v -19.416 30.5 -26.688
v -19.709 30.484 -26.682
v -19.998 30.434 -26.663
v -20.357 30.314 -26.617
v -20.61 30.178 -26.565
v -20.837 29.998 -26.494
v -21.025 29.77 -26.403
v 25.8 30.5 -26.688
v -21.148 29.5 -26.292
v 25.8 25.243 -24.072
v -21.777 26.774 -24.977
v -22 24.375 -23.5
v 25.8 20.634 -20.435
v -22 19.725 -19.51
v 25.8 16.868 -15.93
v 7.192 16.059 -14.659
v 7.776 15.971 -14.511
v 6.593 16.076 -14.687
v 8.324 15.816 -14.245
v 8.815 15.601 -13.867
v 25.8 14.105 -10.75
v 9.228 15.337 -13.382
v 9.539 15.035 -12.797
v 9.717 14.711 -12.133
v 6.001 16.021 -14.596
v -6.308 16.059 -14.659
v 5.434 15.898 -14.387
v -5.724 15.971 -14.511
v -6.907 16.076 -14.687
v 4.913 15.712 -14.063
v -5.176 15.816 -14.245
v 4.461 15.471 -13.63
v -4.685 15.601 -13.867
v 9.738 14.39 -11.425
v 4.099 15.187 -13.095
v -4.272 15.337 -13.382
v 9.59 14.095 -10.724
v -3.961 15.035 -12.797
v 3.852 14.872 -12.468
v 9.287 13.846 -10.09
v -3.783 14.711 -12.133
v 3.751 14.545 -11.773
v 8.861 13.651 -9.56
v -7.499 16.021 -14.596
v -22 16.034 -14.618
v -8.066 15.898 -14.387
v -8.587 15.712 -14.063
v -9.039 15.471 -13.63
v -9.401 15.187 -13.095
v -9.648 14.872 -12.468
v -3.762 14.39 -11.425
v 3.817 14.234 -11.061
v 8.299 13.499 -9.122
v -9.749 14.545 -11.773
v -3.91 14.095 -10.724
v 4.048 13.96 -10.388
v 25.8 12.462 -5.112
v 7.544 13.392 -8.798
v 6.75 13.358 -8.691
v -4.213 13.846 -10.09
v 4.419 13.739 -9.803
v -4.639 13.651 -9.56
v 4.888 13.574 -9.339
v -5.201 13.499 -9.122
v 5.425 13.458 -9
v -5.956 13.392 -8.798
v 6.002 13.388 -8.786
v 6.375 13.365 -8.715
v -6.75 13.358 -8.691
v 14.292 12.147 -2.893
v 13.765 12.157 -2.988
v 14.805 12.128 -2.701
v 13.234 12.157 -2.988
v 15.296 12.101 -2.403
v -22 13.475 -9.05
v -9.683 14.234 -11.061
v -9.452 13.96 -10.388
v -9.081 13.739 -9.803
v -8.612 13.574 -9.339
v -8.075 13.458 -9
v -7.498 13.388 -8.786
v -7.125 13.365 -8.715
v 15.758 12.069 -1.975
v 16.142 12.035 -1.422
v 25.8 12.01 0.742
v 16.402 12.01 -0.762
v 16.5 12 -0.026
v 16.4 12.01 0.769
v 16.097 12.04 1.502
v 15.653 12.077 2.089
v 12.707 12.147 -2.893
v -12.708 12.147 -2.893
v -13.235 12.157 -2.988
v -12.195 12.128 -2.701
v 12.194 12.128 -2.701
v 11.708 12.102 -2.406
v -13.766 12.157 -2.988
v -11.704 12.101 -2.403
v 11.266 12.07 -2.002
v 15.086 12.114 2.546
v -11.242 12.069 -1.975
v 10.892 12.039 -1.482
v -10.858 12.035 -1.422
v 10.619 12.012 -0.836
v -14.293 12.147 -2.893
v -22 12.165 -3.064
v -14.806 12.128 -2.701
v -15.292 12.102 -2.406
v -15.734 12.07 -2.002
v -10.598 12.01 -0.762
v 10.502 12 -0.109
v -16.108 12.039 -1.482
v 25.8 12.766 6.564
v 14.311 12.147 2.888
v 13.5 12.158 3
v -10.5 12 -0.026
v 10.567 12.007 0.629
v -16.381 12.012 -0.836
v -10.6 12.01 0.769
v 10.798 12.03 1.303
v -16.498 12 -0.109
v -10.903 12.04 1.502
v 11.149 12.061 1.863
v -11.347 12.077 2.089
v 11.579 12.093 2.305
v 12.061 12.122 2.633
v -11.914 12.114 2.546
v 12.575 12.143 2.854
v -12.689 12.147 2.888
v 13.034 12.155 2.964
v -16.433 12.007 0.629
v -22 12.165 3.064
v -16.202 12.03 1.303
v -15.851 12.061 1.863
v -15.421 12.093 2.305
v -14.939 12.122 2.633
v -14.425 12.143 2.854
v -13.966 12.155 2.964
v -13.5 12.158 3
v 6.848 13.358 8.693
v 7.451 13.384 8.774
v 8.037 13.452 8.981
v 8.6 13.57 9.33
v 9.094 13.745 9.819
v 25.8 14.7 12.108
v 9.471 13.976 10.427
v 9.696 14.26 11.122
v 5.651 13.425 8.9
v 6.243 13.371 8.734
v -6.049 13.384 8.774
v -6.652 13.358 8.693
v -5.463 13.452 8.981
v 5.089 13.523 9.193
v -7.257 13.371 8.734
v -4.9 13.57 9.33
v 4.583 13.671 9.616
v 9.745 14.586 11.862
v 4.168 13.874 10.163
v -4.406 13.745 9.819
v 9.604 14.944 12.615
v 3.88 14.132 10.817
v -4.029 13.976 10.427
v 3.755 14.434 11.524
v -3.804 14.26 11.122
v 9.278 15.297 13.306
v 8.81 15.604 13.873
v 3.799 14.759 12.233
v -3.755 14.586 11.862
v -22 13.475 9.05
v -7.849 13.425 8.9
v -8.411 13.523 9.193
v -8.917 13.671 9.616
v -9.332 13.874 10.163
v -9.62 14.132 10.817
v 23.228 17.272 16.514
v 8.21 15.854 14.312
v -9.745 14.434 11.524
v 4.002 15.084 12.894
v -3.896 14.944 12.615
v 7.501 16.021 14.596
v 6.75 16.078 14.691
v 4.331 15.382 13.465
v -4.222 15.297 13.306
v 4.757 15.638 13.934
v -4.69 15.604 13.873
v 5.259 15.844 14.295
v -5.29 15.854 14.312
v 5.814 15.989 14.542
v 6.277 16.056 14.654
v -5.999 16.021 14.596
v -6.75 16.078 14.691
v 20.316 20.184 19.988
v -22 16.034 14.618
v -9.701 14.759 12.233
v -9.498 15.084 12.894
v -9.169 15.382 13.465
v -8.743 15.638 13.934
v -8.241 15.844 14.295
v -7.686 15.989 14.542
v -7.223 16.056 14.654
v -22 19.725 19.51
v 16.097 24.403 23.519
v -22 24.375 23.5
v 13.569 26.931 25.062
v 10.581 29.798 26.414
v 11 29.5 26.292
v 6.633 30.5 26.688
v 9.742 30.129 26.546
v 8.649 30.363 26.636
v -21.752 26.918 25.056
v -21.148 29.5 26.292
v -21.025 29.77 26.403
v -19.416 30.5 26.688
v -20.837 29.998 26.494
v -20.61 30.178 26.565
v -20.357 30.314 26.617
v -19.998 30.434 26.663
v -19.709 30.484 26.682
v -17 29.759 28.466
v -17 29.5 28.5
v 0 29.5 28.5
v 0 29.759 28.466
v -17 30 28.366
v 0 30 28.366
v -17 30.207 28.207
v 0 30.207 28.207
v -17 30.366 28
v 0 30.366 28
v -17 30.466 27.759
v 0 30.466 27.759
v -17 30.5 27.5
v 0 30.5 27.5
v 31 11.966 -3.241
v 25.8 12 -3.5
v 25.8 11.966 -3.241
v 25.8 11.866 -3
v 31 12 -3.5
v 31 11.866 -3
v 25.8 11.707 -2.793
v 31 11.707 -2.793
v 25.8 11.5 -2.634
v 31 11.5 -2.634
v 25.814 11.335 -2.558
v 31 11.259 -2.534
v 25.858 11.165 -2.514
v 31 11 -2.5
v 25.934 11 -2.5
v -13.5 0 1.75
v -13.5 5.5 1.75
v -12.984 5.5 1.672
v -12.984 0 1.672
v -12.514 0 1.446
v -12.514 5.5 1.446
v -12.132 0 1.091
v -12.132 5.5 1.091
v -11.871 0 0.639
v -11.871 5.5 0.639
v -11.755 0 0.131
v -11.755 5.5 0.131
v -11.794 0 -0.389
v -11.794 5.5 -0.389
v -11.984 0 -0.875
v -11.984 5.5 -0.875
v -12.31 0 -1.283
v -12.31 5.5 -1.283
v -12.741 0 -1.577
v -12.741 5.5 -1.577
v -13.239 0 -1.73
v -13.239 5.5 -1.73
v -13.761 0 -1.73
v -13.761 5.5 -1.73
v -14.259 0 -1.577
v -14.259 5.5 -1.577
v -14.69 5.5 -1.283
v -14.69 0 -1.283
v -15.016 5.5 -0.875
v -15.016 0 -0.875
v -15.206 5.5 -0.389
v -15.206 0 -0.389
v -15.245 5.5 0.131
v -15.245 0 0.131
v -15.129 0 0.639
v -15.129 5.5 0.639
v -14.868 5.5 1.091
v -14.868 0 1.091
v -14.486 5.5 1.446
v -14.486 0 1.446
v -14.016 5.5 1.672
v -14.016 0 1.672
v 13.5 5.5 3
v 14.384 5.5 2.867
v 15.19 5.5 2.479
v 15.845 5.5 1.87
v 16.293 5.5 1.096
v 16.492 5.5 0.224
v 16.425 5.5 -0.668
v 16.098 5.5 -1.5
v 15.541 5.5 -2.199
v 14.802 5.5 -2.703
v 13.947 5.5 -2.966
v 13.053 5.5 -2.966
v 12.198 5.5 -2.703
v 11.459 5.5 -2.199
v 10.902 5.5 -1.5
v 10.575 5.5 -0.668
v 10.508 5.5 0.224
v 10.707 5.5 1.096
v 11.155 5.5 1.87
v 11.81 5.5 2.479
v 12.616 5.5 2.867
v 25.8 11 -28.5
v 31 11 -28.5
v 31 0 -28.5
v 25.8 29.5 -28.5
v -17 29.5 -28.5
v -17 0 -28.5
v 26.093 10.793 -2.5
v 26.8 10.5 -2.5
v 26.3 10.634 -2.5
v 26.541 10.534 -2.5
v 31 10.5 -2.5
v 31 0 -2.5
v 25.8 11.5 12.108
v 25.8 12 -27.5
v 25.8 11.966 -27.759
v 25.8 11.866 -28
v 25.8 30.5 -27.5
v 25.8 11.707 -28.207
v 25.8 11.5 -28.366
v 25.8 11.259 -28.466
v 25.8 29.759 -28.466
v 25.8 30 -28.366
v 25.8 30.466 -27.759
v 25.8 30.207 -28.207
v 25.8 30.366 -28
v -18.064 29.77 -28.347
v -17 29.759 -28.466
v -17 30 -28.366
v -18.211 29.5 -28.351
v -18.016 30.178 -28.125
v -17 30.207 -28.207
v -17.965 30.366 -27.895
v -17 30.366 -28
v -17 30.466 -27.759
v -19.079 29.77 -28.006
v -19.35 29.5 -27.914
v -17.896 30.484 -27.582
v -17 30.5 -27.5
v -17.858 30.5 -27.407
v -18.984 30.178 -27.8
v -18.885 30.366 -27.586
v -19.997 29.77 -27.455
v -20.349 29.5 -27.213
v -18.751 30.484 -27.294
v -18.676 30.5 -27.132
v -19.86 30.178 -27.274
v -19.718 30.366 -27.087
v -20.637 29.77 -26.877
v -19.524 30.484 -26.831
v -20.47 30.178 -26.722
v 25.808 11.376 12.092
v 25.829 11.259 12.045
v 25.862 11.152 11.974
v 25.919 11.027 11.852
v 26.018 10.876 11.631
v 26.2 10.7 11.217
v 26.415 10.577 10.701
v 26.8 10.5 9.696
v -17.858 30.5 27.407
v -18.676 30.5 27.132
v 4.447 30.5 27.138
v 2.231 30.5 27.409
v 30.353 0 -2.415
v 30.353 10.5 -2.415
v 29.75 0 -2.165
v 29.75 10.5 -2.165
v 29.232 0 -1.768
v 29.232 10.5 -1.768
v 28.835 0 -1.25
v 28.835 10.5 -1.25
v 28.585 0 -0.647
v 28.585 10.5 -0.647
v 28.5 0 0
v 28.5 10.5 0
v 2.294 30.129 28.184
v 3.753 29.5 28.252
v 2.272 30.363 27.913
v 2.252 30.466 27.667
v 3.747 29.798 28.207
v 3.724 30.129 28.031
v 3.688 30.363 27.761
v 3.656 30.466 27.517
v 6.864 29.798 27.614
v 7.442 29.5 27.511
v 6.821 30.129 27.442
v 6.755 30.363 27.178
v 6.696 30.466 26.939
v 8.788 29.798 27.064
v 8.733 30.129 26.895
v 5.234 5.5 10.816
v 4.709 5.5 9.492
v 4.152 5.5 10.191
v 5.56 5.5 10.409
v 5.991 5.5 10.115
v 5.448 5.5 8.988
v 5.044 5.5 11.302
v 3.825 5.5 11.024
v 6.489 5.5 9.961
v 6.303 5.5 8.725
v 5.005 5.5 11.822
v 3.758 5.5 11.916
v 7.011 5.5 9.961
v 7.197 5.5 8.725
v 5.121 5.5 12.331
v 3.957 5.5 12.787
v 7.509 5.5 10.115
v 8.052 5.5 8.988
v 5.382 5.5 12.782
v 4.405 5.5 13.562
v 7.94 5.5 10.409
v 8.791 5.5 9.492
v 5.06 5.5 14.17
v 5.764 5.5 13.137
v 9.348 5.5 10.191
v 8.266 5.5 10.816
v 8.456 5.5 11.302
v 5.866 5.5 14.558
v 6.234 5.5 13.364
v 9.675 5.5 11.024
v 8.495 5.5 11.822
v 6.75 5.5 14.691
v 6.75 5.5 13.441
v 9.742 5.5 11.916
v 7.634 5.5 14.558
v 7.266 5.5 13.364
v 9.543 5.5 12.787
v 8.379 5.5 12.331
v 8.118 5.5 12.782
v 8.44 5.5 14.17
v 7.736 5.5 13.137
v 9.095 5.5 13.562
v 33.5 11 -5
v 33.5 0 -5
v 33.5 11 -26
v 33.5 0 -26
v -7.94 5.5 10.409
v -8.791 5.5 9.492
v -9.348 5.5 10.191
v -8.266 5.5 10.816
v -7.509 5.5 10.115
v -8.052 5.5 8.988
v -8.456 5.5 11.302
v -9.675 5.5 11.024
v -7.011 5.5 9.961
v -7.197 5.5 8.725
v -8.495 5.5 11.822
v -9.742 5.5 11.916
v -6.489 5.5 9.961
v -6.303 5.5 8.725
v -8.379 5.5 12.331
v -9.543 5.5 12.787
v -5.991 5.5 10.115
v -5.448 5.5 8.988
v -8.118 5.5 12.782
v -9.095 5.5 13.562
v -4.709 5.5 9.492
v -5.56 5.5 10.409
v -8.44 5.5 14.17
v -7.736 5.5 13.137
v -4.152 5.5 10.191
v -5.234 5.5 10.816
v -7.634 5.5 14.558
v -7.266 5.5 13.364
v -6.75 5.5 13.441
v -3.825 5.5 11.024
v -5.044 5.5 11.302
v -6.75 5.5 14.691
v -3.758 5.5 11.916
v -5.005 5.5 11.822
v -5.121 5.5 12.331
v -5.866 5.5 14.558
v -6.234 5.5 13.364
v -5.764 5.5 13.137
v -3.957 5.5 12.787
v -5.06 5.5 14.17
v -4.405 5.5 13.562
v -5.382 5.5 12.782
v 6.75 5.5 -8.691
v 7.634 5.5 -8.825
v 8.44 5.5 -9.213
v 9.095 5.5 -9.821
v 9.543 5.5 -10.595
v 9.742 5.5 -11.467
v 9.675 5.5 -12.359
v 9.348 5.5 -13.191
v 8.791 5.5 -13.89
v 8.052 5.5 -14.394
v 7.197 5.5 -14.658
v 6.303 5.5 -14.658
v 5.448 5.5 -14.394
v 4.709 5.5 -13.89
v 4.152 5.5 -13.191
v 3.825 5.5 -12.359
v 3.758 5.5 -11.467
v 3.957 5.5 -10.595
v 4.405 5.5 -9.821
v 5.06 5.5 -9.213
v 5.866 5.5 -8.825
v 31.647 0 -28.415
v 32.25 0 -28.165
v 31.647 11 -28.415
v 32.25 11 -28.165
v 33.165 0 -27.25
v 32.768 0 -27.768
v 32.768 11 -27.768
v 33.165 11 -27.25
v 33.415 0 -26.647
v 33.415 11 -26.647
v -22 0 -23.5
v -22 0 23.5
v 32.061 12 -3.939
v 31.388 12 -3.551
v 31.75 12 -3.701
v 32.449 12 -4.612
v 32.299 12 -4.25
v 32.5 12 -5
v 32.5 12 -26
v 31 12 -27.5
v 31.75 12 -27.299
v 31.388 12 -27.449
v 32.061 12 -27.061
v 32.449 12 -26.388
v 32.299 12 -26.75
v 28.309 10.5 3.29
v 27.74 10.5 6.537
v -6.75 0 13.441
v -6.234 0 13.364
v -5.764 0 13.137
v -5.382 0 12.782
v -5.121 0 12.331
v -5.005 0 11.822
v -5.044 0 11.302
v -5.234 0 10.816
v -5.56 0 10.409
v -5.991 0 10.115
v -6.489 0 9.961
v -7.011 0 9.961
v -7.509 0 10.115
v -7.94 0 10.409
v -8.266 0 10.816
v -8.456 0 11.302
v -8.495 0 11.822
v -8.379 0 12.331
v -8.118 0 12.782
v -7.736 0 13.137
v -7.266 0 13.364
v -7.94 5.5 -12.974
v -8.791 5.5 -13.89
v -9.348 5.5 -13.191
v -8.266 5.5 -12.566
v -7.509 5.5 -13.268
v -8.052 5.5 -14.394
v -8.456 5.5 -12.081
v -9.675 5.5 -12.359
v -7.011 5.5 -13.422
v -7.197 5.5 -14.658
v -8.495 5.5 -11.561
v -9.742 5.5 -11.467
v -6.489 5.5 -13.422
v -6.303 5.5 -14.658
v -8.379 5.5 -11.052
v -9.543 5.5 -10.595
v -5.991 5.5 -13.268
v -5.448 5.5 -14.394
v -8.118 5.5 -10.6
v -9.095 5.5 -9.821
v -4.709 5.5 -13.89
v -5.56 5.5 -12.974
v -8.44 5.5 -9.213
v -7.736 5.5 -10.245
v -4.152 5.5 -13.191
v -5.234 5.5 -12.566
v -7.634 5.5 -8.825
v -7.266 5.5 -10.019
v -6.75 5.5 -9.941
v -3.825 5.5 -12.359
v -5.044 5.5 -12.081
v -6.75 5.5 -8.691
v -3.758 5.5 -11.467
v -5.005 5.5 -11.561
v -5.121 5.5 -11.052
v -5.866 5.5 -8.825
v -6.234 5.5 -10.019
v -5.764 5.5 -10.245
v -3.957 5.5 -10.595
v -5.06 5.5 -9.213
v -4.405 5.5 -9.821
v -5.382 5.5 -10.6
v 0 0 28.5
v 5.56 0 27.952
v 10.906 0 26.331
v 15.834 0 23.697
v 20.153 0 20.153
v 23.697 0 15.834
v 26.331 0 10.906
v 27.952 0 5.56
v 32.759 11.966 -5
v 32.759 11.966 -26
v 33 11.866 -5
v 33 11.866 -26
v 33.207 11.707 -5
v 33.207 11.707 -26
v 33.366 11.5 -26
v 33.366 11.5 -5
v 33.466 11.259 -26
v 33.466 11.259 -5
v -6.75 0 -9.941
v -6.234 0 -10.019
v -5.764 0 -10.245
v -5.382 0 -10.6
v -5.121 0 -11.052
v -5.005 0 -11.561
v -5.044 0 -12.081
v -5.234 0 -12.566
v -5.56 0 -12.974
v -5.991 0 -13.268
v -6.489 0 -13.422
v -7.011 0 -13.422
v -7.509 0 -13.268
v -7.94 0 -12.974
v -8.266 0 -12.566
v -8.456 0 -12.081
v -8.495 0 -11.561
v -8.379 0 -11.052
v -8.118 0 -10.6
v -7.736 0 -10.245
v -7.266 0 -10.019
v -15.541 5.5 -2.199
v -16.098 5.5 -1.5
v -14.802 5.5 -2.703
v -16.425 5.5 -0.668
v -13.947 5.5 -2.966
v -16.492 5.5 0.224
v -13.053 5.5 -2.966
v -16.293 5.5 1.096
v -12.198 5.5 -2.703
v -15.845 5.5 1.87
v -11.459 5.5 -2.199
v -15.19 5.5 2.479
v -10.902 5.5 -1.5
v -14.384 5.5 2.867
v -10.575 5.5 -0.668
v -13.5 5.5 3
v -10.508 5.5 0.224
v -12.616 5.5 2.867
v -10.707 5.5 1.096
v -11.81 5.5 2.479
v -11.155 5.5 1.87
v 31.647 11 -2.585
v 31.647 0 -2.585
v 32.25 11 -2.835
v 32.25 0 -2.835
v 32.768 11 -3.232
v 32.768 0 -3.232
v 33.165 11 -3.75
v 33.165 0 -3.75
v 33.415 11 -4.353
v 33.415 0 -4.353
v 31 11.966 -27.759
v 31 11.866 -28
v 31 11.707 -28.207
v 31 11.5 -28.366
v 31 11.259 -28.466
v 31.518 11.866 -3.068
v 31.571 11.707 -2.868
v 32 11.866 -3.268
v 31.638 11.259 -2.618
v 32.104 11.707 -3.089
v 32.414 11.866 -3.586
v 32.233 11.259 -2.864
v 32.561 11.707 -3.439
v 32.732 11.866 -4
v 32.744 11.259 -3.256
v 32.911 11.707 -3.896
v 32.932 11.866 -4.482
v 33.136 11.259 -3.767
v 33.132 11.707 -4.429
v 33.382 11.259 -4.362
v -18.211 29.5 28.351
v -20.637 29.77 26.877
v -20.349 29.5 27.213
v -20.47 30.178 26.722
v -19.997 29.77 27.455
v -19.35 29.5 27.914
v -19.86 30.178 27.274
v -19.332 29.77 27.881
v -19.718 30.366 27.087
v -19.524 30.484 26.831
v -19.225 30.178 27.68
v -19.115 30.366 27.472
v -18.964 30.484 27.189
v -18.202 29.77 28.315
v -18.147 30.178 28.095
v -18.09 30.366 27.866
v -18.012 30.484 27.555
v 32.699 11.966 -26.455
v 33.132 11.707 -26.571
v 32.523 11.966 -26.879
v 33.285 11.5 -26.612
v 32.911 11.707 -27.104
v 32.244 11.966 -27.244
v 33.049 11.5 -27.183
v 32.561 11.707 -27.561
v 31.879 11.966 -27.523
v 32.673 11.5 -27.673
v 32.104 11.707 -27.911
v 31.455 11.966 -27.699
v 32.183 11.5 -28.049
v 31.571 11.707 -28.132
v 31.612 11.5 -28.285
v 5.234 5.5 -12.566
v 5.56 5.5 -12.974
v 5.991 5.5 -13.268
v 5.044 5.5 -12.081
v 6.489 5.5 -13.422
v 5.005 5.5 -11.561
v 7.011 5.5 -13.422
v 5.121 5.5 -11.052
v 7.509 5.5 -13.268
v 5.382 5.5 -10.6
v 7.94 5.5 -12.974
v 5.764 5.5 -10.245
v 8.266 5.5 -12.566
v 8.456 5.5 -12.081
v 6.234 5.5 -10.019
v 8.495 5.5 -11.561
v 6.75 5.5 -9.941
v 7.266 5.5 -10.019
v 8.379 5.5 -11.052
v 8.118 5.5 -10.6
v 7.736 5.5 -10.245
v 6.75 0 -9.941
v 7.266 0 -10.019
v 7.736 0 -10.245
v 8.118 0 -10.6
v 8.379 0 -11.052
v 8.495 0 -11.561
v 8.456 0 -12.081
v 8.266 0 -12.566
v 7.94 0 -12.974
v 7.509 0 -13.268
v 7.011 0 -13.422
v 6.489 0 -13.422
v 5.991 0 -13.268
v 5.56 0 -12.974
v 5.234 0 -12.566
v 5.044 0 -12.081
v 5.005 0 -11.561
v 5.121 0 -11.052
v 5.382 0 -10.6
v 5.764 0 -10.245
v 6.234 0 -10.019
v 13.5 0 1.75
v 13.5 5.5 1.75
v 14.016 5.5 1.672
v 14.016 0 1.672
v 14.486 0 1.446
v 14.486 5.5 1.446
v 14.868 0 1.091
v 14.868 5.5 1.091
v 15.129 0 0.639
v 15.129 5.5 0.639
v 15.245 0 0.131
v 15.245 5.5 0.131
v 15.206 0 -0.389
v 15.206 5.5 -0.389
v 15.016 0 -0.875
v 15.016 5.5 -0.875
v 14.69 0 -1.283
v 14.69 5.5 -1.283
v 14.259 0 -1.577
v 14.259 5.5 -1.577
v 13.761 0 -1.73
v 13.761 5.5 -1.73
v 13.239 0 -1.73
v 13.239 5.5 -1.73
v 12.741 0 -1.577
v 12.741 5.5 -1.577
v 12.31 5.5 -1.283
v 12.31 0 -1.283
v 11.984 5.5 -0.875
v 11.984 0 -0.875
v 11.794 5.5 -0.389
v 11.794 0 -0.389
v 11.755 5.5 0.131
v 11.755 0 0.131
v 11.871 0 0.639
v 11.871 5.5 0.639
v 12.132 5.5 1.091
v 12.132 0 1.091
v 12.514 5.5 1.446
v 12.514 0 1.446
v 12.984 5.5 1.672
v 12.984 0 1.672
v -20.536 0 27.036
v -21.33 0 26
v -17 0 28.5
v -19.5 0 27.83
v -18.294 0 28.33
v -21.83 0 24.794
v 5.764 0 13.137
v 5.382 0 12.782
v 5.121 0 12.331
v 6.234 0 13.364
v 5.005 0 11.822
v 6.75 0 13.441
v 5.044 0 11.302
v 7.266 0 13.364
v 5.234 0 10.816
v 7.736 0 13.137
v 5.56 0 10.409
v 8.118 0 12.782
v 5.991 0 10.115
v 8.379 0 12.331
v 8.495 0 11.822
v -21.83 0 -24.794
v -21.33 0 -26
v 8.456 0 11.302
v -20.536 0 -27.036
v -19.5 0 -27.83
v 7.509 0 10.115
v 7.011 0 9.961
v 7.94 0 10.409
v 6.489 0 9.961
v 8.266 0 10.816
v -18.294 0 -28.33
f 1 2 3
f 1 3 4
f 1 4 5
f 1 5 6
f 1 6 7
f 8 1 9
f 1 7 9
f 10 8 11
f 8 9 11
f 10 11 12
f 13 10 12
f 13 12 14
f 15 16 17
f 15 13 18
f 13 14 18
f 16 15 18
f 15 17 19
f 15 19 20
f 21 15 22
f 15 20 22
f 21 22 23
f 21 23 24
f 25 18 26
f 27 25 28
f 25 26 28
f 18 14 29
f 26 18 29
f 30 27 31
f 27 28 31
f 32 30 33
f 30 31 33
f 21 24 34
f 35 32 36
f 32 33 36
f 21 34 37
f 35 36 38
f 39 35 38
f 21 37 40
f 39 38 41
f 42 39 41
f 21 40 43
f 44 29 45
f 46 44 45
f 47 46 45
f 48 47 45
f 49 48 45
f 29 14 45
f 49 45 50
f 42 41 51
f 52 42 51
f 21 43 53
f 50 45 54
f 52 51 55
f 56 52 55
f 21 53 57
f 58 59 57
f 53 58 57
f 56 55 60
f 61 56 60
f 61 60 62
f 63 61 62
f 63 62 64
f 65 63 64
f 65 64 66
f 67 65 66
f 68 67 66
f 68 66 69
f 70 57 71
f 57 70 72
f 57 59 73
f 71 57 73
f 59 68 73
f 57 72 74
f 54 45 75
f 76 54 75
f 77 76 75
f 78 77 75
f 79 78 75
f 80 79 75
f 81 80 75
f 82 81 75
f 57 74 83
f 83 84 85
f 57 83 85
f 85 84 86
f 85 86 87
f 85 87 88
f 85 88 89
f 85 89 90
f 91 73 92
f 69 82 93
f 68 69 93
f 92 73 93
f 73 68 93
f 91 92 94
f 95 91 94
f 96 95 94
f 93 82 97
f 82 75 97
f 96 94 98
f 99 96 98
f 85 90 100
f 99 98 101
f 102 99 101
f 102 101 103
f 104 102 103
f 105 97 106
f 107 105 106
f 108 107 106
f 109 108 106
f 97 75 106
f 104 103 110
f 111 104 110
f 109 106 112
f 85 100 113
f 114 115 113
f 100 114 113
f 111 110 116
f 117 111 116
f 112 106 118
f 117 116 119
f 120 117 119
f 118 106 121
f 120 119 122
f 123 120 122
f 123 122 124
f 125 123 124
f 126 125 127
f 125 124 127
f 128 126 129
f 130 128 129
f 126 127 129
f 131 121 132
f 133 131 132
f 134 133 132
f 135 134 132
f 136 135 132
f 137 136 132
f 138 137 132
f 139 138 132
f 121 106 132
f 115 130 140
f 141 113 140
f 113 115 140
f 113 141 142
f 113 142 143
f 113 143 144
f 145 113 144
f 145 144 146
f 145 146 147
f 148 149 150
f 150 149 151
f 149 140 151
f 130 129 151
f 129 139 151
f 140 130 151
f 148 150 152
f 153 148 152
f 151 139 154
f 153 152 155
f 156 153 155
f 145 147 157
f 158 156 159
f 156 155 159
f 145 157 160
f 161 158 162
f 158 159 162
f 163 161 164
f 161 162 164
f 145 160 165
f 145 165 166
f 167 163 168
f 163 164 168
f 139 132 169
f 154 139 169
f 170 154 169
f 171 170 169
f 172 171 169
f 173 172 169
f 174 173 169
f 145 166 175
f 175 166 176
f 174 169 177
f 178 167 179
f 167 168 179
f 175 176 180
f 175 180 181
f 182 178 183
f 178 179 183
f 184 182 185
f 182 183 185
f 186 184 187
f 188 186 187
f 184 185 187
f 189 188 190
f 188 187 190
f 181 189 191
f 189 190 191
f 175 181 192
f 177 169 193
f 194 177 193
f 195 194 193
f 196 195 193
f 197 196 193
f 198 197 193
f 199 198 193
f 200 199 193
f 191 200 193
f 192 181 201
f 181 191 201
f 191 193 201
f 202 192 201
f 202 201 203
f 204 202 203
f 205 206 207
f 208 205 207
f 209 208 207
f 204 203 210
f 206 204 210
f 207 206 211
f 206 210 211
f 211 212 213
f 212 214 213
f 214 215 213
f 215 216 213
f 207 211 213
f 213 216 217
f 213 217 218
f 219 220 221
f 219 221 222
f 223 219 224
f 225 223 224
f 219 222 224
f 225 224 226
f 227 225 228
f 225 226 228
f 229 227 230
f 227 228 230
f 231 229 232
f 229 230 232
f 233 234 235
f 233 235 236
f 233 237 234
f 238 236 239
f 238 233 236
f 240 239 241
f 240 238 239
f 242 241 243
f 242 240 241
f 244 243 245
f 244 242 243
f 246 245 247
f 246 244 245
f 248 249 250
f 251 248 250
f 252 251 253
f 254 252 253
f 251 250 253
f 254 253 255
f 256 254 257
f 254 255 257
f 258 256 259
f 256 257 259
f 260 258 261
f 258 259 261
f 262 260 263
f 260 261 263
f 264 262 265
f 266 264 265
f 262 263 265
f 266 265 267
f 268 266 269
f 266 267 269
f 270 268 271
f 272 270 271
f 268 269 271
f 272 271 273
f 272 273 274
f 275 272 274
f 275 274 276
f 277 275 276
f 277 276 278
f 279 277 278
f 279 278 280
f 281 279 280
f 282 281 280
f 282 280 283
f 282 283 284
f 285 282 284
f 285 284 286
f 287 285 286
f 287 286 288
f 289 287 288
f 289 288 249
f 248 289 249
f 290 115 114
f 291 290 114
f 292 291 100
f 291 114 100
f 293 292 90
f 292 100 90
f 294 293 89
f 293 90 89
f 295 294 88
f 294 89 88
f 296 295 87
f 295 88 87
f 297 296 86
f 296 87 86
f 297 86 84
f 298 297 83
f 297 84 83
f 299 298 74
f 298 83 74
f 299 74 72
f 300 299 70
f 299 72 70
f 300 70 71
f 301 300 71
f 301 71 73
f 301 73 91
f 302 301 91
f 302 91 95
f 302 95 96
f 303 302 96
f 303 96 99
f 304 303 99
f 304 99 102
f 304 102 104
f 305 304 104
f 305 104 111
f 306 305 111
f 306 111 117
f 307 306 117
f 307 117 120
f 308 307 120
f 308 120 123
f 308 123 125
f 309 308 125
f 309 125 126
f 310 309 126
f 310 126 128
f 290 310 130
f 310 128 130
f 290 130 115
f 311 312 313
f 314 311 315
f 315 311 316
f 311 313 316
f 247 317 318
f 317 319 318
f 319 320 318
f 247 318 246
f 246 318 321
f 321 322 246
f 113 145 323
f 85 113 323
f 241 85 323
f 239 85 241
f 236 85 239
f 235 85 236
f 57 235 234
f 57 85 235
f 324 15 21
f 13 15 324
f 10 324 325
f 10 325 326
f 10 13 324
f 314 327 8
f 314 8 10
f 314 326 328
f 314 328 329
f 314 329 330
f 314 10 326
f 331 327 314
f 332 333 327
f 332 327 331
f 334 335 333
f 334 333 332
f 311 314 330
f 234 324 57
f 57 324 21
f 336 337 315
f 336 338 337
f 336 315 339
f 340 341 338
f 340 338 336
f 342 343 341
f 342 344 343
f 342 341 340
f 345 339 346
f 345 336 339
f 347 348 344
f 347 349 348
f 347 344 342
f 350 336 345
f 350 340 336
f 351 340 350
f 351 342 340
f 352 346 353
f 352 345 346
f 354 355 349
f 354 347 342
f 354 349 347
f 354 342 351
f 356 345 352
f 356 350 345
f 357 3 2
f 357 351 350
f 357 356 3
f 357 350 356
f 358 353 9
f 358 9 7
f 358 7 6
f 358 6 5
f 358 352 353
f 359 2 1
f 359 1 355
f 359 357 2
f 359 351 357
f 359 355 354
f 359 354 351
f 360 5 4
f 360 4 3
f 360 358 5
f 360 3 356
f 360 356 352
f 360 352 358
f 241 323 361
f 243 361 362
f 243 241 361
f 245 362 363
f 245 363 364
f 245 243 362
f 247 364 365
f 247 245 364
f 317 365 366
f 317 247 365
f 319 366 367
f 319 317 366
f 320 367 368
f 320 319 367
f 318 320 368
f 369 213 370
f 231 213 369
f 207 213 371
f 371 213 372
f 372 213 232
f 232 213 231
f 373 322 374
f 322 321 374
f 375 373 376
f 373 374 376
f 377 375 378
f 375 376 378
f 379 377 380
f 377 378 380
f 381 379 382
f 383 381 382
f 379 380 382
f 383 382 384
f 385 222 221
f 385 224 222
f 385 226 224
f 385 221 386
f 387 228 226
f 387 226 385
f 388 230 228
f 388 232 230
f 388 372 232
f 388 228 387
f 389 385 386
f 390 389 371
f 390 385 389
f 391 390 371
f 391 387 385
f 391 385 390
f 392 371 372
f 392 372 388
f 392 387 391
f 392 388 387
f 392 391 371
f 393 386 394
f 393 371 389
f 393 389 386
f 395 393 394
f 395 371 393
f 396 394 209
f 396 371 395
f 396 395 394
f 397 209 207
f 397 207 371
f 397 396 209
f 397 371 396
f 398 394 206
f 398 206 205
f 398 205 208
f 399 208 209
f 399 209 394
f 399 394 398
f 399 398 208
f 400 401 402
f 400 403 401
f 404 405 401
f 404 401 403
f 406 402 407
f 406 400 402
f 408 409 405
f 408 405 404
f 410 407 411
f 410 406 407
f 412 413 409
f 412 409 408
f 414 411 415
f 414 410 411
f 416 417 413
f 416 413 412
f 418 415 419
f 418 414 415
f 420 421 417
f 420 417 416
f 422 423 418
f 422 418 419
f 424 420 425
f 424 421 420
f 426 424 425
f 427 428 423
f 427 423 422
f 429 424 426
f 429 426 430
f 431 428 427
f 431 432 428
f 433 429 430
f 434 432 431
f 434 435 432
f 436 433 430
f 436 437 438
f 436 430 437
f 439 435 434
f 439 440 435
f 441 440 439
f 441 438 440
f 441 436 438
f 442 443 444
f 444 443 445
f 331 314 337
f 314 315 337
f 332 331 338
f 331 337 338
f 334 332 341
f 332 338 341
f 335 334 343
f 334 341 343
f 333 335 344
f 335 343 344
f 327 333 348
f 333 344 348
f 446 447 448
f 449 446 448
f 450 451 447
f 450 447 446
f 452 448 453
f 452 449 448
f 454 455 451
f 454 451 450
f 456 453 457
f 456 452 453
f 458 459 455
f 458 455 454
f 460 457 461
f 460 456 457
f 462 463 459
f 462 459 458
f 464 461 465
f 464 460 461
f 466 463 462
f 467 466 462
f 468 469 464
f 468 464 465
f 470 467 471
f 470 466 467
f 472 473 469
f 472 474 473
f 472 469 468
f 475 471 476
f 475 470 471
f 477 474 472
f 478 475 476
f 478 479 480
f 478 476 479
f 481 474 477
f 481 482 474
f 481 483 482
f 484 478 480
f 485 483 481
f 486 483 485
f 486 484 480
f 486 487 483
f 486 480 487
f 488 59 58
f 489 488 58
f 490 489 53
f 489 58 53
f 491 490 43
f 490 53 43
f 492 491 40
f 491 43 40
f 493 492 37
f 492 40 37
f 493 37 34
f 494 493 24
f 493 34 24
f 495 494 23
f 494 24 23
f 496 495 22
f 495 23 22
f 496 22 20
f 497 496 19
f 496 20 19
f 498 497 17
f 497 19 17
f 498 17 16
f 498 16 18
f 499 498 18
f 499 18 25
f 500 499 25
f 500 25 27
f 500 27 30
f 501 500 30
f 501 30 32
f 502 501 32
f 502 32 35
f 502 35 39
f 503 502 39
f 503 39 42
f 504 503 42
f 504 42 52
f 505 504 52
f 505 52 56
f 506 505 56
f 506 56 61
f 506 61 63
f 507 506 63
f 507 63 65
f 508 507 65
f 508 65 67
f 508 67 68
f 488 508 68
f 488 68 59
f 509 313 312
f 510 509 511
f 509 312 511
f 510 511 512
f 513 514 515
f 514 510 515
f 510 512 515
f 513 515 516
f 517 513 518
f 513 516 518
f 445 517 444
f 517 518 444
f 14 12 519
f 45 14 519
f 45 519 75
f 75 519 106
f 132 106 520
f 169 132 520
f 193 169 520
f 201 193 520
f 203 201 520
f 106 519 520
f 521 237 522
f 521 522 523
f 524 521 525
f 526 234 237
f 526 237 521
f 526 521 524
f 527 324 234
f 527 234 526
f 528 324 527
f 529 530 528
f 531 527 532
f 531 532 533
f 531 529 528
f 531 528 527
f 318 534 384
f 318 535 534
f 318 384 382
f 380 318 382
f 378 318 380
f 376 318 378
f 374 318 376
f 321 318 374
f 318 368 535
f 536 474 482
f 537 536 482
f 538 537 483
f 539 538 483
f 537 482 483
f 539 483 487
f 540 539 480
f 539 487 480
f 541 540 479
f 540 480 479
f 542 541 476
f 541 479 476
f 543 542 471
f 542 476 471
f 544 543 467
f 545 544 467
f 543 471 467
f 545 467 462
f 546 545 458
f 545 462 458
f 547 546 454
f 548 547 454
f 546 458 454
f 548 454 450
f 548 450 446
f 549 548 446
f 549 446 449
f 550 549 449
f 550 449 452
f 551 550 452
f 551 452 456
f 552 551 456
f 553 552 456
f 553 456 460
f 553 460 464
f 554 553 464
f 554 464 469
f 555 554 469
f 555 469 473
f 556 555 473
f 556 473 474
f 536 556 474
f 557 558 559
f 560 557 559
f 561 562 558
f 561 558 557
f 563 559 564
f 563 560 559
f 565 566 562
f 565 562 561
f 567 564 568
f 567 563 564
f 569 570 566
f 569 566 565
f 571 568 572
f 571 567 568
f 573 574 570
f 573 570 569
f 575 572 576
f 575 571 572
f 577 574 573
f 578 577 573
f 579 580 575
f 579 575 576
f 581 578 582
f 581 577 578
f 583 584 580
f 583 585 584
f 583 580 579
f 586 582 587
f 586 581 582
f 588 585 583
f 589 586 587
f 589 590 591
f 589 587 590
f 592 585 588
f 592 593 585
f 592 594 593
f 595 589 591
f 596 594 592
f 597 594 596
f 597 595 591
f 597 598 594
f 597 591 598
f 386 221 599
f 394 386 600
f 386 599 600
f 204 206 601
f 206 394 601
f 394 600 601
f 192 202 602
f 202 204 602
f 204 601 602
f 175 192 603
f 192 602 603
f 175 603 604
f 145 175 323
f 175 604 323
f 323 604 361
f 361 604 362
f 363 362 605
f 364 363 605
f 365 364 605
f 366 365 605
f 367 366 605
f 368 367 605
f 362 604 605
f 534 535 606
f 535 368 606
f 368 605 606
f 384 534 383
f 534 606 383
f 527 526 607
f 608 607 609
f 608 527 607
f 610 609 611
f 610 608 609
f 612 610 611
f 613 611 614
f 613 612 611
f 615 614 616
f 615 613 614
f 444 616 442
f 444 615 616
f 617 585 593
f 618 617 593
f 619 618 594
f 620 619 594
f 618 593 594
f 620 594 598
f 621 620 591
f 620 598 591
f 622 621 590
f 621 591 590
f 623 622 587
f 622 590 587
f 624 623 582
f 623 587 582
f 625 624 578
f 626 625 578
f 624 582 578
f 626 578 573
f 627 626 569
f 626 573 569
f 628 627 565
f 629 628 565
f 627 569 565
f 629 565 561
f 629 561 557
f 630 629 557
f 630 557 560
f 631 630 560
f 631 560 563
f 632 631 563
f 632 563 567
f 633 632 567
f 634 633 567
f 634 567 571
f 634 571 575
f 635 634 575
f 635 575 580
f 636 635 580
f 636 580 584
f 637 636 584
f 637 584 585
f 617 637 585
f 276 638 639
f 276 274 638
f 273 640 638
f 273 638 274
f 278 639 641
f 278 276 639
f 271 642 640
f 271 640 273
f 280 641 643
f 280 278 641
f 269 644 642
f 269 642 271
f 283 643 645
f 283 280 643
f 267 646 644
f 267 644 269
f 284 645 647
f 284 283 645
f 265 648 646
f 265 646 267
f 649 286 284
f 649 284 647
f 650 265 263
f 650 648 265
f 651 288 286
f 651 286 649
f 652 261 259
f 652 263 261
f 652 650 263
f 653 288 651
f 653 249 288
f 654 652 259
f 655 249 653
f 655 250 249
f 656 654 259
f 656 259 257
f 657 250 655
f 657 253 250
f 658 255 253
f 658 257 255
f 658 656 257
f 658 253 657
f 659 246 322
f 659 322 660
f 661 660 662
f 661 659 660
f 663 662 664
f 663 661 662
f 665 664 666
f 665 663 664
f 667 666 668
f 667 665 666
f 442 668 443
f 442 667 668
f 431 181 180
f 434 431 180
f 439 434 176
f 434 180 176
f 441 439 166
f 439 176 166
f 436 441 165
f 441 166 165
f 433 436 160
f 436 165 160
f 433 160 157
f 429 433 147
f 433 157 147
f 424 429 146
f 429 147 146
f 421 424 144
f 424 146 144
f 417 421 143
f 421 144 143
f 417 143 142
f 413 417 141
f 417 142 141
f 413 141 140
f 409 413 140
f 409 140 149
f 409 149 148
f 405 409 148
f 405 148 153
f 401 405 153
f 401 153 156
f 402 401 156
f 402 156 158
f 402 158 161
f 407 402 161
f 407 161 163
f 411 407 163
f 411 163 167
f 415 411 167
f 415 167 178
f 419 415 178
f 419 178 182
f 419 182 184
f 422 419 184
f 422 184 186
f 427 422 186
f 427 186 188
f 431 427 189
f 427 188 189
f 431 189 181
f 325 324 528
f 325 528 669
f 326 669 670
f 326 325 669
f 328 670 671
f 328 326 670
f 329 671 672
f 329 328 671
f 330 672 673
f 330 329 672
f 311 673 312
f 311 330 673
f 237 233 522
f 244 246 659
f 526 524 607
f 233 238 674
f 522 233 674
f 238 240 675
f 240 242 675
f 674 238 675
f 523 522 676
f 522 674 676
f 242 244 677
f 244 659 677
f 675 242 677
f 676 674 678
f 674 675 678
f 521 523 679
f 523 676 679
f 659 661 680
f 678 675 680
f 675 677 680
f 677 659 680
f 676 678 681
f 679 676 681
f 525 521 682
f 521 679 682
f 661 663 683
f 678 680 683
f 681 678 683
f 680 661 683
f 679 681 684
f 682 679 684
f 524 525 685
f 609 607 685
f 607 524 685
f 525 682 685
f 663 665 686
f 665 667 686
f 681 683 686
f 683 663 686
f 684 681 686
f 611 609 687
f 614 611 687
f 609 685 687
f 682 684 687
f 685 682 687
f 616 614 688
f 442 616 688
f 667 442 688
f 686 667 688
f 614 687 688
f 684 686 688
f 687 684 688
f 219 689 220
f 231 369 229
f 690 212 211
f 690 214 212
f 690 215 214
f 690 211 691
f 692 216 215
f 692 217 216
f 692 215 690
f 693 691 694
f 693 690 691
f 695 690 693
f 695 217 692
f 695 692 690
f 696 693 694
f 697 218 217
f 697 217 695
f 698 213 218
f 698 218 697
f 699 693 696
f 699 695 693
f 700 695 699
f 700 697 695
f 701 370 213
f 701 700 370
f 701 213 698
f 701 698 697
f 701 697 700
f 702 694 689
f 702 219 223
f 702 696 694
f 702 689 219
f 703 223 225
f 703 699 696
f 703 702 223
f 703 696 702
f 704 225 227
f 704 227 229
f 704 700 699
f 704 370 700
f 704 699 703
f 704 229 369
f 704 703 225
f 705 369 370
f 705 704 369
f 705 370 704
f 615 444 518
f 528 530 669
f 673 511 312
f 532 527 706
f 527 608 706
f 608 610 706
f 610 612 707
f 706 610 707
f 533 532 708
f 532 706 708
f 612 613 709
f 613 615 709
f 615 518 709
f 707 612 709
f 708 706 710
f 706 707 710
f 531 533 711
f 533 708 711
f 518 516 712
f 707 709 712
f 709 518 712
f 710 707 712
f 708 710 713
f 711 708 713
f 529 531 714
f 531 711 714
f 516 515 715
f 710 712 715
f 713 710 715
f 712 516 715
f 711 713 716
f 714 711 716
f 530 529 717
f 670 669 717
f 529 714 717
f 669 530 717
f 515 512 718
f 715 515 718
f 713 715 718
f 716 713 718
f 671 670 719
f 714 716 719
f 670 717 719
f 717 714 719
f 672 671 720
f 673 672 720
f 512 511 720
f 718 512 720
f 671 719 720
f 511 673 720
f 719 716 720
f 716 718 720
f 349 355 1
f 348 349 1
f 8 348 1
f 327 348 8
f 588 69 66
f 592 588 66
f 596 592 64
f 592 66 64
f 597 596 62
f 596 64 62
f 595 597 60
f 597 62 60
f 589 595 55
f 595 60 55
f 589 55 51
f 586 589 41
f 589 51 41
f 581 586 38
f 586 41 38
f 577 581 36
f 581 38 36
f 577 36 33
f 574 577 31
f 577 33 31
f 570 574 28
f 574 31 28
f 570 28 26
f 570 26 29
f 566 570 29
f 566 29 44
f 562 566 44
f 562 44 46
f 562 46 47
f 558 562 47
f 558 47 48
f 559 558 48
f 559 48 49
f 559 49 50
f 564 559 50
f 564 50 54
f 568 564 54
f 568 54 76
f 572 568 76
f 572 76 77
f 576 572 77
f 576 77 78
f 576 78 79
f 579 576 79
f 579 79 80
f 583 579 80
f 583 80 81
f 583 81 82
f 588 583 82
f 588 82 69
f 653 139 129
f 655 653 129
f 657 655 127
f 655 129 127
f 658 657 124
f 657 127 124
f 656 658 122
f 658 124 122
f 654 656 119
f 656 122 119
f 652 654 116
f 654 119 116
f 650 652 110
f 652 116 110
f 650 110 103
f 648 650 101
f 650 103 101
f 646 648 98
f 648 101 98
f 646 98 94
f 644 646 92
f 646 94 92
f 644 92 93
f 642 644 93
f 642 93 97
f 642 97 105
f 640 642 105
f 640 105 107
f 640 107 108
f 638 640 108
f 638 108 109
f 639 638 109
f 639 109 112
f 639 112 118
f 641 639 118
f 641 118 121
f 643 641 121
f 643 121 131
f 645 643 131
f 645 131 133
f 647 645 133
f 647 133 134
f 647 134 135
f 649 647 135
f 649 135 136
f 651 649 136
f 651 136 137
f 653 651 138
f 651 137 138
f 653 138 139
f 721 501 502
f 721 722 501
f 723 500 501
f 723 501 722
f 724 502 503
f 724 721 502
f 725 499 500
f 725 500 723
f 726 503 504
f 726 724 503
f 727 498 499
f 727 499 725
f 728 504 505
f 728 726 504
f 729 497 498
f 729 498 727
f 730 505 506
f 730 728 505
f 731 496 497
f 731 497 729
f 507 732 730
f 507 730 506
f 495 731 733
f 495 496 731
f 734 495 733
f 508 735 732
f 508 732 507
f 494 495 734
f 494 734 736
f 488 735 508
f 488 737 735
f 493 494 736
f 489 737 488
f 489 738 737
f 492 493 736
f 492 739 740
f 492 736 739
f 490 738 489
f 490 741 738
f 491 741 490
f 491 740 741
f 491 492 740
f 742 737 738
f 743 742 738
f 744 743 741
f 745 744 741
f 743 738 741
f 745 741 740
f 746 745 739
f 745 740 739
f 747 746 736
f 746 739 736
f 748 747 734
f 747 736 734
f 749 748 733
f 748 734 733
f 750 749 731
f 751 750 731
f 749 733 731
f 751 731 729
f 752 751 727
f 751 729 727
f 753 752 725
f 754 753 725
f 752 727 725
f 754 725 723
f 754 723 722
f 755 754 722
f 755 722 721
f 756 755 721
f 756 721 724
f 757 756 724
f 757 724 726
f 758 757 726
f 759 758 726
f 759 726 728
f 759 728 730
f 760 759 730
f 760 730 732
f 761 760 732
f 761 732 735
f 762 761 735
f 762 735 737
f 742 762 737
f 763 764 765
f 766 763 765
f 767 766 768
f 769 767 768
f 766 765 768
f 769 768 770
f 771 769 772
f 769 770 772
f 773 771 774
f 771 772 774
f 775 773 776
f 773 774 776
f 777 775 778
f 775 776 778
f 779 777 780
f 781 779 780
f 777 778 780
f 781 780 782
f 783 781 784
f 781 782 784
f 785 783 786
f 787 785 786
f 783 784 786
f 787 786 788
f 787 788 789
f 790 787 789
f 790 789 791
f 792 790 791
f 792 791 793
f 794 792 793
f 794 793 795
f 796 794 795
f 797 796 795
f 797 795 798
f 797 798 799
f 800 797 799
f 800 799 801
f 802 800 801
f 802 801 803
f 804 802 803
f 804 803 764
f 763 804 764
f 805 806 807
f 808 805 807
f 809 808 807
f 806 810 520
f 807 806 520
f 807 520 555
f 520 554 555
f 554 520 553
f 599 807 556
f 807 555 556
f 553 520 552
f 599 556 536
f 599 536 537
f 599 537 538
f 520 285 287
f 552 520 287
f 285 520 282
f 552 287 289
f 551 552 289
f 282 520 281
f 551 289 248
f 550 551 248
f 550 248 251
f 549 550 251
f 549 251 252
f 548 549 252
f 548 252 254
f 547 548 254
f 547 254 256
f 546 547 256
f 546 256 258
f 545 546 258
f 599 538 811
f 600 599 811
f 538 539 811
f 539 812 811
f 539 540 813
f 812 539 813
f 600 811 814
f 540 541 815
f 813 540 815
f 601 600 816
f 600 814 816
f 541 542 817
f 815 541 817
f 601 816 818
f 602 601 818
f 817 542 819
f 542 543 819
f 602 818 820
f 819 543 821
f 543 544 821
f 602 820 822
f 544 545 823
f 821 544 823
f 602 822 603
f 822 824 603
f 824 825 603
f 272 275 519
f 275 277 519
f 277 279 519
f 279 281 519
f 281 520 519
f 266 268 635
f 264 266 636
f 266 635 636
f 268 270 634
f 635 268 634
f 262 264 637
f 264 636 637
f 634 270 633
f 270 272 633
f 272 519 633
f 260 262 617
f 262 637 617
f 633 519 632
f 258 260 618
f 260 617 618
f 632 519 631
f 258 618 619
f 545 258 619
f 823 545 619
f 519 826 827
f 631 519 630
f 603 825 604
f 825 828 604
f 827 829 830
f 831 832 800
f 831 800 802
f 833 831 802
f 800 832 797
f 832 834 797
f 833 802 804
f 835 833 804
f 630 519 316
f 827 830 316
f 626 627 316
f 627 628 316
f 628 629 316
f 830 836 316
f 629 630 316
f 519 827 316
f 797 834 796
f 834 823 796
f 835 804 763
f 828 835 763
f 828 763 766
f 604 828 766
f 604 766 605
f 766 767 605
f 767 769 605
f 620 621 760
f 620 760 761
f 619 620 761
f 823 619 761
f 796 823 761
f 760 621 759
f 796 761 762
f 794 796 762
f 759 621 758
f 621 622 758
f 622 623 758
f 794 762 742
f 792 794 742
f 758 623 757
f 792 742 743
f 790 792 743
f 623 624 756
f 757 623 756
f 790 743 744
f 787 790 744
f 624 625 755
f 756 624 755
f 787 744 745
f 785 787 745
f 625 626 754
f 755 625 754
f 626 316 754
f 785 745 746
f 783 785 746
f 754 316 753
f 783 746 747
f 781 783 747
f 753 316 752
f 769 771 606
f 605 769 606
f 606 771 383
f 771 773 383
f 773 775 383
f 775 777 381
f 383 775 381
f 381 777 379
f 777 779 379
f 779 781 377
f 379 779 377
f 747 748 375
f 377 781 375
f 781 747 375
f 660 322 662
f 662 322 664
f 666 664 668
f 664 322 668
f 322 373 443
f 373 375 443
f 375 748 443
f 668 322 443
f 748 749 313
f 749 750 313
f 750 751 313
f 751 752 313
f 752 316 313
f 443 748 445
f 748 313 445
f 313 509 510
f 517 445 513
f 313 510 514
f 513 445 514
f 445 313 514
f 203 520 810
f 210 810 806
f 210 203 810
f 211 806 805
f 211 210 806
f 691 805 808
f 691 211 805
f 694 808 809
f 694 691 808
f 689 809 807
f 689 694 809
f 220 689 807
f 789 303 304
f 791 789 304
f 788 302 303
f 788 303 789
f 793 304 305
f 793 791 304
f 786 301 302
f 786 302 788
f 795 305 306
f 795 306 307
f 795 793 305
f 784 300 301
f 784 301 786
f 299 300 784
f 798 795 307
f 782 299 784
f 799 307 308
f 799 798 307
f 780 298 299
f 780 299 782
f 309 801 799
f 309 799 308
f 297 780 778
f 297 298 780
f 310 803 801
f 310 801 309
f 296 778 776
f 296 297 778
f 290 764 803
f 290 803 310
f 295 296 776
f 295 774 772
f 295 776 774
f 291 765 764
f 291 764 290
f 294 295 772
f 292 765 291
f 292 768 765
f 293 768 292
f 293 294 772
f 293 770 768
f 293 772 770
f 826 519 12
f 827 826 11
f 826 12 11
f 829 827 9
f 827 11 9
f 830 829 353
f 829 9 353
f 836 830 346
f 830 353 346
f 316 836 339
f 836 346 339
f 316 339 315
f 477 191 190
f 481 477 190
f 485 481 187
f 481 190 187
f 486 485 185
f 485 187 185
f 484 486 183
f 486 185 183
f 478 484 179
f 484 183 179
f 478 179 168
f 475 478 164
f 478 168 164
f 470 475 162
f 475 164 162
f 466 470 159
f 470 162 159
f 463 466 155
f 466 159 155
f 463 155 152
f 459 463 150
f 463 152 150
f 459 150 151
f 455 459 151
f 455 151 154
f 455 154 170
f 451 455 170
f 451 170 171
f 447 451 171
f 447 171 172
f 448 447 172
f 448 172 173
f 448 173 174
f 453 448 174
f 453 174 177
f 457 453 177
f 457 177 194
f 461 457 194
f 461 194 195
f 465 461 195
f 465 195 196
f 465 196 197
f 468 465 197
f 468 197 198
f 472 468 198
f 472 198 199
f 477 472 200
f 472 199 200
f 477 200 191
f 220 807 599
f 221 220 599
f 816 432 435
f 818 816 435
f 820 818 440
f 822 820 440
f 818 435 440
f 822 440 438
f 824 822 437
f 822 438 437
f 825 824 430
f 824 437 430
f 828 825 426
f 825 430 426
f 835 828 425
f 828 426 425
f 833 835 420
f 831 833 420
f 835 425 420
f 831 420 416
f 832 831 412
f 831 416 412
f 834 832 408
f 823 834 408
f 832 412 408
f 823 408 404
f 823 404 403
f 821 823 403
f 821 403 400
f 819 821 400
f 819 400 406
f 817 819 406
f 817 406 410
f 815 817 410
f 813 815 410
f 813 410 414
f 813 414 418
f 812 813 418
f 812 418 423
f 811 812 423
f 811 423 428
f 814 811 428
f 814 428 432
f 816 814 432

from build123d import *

# Parameters (mm, degrees)
EXTRUDE_1_DEPTH     = 40.5
SKETCH_2_R          = 1.75
CUT_EXTRUDE_1_DEPTH = 44
FILLET_6_R          = 5
SKETCH_5_R          = 3
CUT_EXTRUDE_2_DEPTH = 35
SKETCH_6_R          = 7.5
CUT_EXTRUDE_3_DEPTH = 10
CUT_EXTRUDE_4_REACH = 76.382
SKETCH_8_R          = 28.5
SKETCH_4_W          = 7.7
SKETCH_4_H          = 50
CUT_EXTRUDE_5_DEPTH = 30
SKETCH_9_W          = 74.837423064
SKETCH_9_H          = 60.925338007
CUT_EXTRUDE_6_DEPTH = 10
SKETCH_11_W         = 7.7
SKETCH_11_H         = 26
EXTRUDE_2_DEPTH     = 1.5
FILLET_12_R         = 2.5
FILLET_13_R         = 1
FILLET_14_R         = 1
FILLET_15_R         = 2.5
FILLET_START        = 25.8
FILLET_16_DEPTH     = 8.2
FILLET_16_2_ANGLE   = 90
FILLET_17_R         = 1


with BuildPart() as part:
    # 草图1 → 凸台-拉伸1 (new body)
    with BuildSketch(Plane(origin=(0, 0, 0), x_dir=(1, 0, 0), z_dir=(0, 1, 0))):
        with BuildLine():
            Line((0, 28.5), (-22, 28.5))
            Line((-22, 28.5), (-22, -28.5))
            Line((-22, -28.5), (0, -28.5))
            ThreePointArc((0, -28.5), (20.152543264, -20.152543264), (28.5, 0))
            Line((28.5, 0), (28.5, 2.5))
            Line((28.5, 2.5), (33.5, 2.5))
            Line((33.5, 2.5), (33.5, 28.5))
            Line((33.5, 28.5), (0, 28.5))
        make_face()
    extrude(amount=EXTRUDE_1_DEPTH)

    # 草图2 → 切除-拉伸1 (cut)
    with BuildSketch(Plane(origin=(0, 40.5, 0), x_dir=(1, 0, 0), z_dir=(0, 1, 0))):
        with Locations(Location((-13.5, 0, 0), (0, 0, 270))):
            Circle(SKETCH_2_R)
        with Locations(Location((-6.75, 11.691342951, 0), (0, 0, 270))):
            Circle(SKETCH_2_R)
        with Locations(Location((6.75, 11.691342951, 0), (0, 0, 270))):
            Circle(SKETCH_2_R)
        with Locations(Location((13.5, 0, 0), (0, 0, 270))):
            Circle(SKETCH_2_R)
        with Locations(Location((6.75, -11.691342951, 0), (0, 0, 270))):
            Circle(SKETCH_2_R)
        with Locations(Location((-6.75, -11.691342951, 0), (0, 0, 270))):
            Circle(SKETCH_2_R)
    extrude(amount=-CUT_EXTRUDE_1_DEPTH, mode=Mode.SUBTRACT)

    # 圆角6
    fillet_6_edges = [part.edges().sort_by_distance(p)[0] for p in [
        (-22, 20.25, 28.5),
        (-22, 20.25, -28.5),
    ]]
    fillet(fillet_6_edges, radius=FILLET_6_R)

    # 草图5 → 切除-拉伸2 (cut)
    with BuildSketch(Plane(origin=(0, 40.5, 0), x_dir=(1, 0, 0), z_dir=(0, 1, 0))):
        with Locations(Location((-13.5, 0, 0), (0, 0, 270))):
            Circle(SKETCH_5_R)
        with Locations(Location((-6.75, 11.691342951, 0), (0, 0, 270))):
            Circle(SKETCH_5_R)
        with Locations(Location((6.75, 11.691342951, 0), (0, 0, 270))):
            Circle(SKETCH_5_R)
        with Locations(Location((13.5, 0, 0), (0, 0, 270))):
            Circle(SKETCH_5_R)
        with Locations(Location((6.75, -11.691342951, 0), (0, 0, 270))):
            Circle(SKETCH_5_R)
        with Locations(Location((-6.75, -11.691342951, 0), (0, 0, 270))):
            Circle(SKETCH_5_R)
    extrude(amount=-CUT_EXTRUDE_2_DEPTH, mode=Mode.SUBTRACT)

    # 草图6 → 切除-拉伸3 (cut)
    with BuildSketch(Plane(origin=(0, 40.5, 0), x_dir=(1, 0, 0), z_dir=(0, 1, 0))):
        with Locations(Location((0, 0, 0), (0, 0, 270))):
            Circle(SKETCH_6_R)
    extrude(amount=-CUT_EXTRUDE_3_DEPTH, mode=Mode.SUBTRACT)

    # 切除-拉伸4: up to this face of the body (flat: up to its plane)
    cut_extrude_4_end = Plane(part.part.faces().sort_by_distance((28.5, 20.25, -1.25))[0])
    # 草图8 → 切除-拉伸4 (cut, up to the picked face)
    with BuildSketch(Plane.ZY.offset(22), mode=Mode.PRIVATE) as cut_extrude_4_sk1:
        with Locations((0, 40.5)):
            Circle(SKETCH_8_R)
    cut_extrude_4_tool1 = split(extrude(cut_extrude_4_sk1.sketch, amount=-CUT_EXTRUDE_4_REACH, mode=Mode.PRIVATE), bisect_by=cut_extrude_4_end, keep=Keep.BOTH, mode=Mode.PRIVATE)
    add(cut_extrude_4_tool1.solids().sort_by(Axis((-22, 40.5, 0), (1, 0, 0)))[0], mode=Mode.SUBTRACT)

    # 草图4 → 切除-拉伸5 (cut)
    with BuildSketch(Plane(origin=(0, 40.5, 0), x_dir=(1, 0, 0), z_dir=(0, 1, 0))):
        with Locations((29.65, 3.5)):
            Rectangle(SKETCH_4_W, SKETCH_4_H)
    extrude(amount=-CUT_EXTRUDE_5_DEPTH, mode=Mode.SUBTRACT)

    # 草图9 → 切除-拉伸6 (cut)
    with BuildSketch(Plane(origin=(0, 40.5, 0), x_dir=(1, 0, 0), z_dir=(0, 1, 0))):
        with Locations((5.520272929, 0.012240625)):
            Rectangle(SKETCH_9_W, SKETCH_9_H)
    extrude(amount=-CUT_EXTRUDE_6_DEPTH, mode=Mode.SUBTRACT)

    # 草图11 → 凸台-拉伸2 (add)
    with BuildSketch(Plane(origin=(0, 10.5, 0), x_dir=(1, 0, 0), z_dir=(0, 1, 0))):
        with Locations((29.65, 15.5)):
            Rectangle(SKETCH_11_W, SKETCH_11_H)
    extrude(amount=EXTRUDE_2_DEPTH)

    # 圆角12
    fillet_12_edges = [part.edges().sort_by_distance(p)[0] for p in [
        (33.5, 6, -2.5),
        (28.5, 5.25, -2.5),
    ]]
    fillet(fillet_12_edges, radius=FILLET_12_R - 0.0001)  # a hair under: the kernel refuses the full size

    # 圆角13
    fillet_13_edges = [part.edges().sort_by_distance(p)[0] for p in [
        (25.8, 10.5, 4.804130821),
    ]]
    fillet(fillet_13_edges, radius=FILLET_13_R)

    # 圆角14
    fillet_14_edges = [part.edges().sort_by_distance(p)[0] for p in [
        (33.5, 12, -16.74995),
        (32.767796242, 12, -3.232203758),
        (28.40005, 12, -2.5),
    ]]
    fillet(fillet_14_edges, radius=FILLET_14_R)

    # 圆角15
    # the kernel refuses this fillet: 2.5 mm, written as the material it takes off along each edge
    with BuildSketch(Plane(origin=(33.5, 17.25, -28.5), x_dir=(-1, 0, 0), z_dir=(0, -1, 0))) as fillet_15_piece_1:
        with BuildLine():
            CenterArc((FILLET_15_R, -FILLET_15_R), FILLET_15_R, 90, 90)
            Line((0, -FILLET_15_R), (0, 0))
            Line((0, 0), (FILLET_15_R, 0))
        make_face()
    extrude(amount=23.5, mode=Mode.SUBTRACT)

    # 圆角16: read off the stored shape, not the designer's step
    # 圆角16 outline → 圆角16 (cut)
    with BuildSketch(Plane.YZ.offset(FILLET_START)):
        with BuildLine():
            Line((12, -28.5), (12, -27.5))
            ThreePointArc((12, -27.5), (11.707106781, -28.207106781), (11, -28.5))
            Line((11, -28.5), (12, -28.5))
        make_face()
    extrude(amount=FILLET_16_DEPTH, mode=Mode.SUBTRACT)

    # Fillet 16 2 outline → Fillet 16 2 (revolve, cut)
    with BuildSketch(Plane(origin=(31, 0, -26), x_dir=(1, 0, 0), z_dir=(0, 0, 1))):
        with BuildLine():
            Line((2.5, 12), (1.5, 12))
            ThreePointArc((1.5, 12), (2.207106781, 11.707106781), (2.5, 11))
            Line((2.5, 11), (2.5, 12))
        make_face()
    revolve(axis=Axis((31, 0, -26), (0, 1, 0)), revolution_arc=FILLET_16_2_ANGLE, mode=Mode.SUBTRACT)

    # 圆角17
    fillet_17_edges = [part.edges().sort_by_distance(p)[0] for p in [
        (-19.128372458, 30.5, -28.024381801),
        (4.4, 30.5, -28.5),
        (-19.128372458, 30.5, 28.024381801),
        (5.081419572, 30.5, 28.043344578),
        (-8.5, 30.5, 28.5),
    ]]
    fillet(fillet_17_edges, radius=FILLET_17_R)


solid = part.part
